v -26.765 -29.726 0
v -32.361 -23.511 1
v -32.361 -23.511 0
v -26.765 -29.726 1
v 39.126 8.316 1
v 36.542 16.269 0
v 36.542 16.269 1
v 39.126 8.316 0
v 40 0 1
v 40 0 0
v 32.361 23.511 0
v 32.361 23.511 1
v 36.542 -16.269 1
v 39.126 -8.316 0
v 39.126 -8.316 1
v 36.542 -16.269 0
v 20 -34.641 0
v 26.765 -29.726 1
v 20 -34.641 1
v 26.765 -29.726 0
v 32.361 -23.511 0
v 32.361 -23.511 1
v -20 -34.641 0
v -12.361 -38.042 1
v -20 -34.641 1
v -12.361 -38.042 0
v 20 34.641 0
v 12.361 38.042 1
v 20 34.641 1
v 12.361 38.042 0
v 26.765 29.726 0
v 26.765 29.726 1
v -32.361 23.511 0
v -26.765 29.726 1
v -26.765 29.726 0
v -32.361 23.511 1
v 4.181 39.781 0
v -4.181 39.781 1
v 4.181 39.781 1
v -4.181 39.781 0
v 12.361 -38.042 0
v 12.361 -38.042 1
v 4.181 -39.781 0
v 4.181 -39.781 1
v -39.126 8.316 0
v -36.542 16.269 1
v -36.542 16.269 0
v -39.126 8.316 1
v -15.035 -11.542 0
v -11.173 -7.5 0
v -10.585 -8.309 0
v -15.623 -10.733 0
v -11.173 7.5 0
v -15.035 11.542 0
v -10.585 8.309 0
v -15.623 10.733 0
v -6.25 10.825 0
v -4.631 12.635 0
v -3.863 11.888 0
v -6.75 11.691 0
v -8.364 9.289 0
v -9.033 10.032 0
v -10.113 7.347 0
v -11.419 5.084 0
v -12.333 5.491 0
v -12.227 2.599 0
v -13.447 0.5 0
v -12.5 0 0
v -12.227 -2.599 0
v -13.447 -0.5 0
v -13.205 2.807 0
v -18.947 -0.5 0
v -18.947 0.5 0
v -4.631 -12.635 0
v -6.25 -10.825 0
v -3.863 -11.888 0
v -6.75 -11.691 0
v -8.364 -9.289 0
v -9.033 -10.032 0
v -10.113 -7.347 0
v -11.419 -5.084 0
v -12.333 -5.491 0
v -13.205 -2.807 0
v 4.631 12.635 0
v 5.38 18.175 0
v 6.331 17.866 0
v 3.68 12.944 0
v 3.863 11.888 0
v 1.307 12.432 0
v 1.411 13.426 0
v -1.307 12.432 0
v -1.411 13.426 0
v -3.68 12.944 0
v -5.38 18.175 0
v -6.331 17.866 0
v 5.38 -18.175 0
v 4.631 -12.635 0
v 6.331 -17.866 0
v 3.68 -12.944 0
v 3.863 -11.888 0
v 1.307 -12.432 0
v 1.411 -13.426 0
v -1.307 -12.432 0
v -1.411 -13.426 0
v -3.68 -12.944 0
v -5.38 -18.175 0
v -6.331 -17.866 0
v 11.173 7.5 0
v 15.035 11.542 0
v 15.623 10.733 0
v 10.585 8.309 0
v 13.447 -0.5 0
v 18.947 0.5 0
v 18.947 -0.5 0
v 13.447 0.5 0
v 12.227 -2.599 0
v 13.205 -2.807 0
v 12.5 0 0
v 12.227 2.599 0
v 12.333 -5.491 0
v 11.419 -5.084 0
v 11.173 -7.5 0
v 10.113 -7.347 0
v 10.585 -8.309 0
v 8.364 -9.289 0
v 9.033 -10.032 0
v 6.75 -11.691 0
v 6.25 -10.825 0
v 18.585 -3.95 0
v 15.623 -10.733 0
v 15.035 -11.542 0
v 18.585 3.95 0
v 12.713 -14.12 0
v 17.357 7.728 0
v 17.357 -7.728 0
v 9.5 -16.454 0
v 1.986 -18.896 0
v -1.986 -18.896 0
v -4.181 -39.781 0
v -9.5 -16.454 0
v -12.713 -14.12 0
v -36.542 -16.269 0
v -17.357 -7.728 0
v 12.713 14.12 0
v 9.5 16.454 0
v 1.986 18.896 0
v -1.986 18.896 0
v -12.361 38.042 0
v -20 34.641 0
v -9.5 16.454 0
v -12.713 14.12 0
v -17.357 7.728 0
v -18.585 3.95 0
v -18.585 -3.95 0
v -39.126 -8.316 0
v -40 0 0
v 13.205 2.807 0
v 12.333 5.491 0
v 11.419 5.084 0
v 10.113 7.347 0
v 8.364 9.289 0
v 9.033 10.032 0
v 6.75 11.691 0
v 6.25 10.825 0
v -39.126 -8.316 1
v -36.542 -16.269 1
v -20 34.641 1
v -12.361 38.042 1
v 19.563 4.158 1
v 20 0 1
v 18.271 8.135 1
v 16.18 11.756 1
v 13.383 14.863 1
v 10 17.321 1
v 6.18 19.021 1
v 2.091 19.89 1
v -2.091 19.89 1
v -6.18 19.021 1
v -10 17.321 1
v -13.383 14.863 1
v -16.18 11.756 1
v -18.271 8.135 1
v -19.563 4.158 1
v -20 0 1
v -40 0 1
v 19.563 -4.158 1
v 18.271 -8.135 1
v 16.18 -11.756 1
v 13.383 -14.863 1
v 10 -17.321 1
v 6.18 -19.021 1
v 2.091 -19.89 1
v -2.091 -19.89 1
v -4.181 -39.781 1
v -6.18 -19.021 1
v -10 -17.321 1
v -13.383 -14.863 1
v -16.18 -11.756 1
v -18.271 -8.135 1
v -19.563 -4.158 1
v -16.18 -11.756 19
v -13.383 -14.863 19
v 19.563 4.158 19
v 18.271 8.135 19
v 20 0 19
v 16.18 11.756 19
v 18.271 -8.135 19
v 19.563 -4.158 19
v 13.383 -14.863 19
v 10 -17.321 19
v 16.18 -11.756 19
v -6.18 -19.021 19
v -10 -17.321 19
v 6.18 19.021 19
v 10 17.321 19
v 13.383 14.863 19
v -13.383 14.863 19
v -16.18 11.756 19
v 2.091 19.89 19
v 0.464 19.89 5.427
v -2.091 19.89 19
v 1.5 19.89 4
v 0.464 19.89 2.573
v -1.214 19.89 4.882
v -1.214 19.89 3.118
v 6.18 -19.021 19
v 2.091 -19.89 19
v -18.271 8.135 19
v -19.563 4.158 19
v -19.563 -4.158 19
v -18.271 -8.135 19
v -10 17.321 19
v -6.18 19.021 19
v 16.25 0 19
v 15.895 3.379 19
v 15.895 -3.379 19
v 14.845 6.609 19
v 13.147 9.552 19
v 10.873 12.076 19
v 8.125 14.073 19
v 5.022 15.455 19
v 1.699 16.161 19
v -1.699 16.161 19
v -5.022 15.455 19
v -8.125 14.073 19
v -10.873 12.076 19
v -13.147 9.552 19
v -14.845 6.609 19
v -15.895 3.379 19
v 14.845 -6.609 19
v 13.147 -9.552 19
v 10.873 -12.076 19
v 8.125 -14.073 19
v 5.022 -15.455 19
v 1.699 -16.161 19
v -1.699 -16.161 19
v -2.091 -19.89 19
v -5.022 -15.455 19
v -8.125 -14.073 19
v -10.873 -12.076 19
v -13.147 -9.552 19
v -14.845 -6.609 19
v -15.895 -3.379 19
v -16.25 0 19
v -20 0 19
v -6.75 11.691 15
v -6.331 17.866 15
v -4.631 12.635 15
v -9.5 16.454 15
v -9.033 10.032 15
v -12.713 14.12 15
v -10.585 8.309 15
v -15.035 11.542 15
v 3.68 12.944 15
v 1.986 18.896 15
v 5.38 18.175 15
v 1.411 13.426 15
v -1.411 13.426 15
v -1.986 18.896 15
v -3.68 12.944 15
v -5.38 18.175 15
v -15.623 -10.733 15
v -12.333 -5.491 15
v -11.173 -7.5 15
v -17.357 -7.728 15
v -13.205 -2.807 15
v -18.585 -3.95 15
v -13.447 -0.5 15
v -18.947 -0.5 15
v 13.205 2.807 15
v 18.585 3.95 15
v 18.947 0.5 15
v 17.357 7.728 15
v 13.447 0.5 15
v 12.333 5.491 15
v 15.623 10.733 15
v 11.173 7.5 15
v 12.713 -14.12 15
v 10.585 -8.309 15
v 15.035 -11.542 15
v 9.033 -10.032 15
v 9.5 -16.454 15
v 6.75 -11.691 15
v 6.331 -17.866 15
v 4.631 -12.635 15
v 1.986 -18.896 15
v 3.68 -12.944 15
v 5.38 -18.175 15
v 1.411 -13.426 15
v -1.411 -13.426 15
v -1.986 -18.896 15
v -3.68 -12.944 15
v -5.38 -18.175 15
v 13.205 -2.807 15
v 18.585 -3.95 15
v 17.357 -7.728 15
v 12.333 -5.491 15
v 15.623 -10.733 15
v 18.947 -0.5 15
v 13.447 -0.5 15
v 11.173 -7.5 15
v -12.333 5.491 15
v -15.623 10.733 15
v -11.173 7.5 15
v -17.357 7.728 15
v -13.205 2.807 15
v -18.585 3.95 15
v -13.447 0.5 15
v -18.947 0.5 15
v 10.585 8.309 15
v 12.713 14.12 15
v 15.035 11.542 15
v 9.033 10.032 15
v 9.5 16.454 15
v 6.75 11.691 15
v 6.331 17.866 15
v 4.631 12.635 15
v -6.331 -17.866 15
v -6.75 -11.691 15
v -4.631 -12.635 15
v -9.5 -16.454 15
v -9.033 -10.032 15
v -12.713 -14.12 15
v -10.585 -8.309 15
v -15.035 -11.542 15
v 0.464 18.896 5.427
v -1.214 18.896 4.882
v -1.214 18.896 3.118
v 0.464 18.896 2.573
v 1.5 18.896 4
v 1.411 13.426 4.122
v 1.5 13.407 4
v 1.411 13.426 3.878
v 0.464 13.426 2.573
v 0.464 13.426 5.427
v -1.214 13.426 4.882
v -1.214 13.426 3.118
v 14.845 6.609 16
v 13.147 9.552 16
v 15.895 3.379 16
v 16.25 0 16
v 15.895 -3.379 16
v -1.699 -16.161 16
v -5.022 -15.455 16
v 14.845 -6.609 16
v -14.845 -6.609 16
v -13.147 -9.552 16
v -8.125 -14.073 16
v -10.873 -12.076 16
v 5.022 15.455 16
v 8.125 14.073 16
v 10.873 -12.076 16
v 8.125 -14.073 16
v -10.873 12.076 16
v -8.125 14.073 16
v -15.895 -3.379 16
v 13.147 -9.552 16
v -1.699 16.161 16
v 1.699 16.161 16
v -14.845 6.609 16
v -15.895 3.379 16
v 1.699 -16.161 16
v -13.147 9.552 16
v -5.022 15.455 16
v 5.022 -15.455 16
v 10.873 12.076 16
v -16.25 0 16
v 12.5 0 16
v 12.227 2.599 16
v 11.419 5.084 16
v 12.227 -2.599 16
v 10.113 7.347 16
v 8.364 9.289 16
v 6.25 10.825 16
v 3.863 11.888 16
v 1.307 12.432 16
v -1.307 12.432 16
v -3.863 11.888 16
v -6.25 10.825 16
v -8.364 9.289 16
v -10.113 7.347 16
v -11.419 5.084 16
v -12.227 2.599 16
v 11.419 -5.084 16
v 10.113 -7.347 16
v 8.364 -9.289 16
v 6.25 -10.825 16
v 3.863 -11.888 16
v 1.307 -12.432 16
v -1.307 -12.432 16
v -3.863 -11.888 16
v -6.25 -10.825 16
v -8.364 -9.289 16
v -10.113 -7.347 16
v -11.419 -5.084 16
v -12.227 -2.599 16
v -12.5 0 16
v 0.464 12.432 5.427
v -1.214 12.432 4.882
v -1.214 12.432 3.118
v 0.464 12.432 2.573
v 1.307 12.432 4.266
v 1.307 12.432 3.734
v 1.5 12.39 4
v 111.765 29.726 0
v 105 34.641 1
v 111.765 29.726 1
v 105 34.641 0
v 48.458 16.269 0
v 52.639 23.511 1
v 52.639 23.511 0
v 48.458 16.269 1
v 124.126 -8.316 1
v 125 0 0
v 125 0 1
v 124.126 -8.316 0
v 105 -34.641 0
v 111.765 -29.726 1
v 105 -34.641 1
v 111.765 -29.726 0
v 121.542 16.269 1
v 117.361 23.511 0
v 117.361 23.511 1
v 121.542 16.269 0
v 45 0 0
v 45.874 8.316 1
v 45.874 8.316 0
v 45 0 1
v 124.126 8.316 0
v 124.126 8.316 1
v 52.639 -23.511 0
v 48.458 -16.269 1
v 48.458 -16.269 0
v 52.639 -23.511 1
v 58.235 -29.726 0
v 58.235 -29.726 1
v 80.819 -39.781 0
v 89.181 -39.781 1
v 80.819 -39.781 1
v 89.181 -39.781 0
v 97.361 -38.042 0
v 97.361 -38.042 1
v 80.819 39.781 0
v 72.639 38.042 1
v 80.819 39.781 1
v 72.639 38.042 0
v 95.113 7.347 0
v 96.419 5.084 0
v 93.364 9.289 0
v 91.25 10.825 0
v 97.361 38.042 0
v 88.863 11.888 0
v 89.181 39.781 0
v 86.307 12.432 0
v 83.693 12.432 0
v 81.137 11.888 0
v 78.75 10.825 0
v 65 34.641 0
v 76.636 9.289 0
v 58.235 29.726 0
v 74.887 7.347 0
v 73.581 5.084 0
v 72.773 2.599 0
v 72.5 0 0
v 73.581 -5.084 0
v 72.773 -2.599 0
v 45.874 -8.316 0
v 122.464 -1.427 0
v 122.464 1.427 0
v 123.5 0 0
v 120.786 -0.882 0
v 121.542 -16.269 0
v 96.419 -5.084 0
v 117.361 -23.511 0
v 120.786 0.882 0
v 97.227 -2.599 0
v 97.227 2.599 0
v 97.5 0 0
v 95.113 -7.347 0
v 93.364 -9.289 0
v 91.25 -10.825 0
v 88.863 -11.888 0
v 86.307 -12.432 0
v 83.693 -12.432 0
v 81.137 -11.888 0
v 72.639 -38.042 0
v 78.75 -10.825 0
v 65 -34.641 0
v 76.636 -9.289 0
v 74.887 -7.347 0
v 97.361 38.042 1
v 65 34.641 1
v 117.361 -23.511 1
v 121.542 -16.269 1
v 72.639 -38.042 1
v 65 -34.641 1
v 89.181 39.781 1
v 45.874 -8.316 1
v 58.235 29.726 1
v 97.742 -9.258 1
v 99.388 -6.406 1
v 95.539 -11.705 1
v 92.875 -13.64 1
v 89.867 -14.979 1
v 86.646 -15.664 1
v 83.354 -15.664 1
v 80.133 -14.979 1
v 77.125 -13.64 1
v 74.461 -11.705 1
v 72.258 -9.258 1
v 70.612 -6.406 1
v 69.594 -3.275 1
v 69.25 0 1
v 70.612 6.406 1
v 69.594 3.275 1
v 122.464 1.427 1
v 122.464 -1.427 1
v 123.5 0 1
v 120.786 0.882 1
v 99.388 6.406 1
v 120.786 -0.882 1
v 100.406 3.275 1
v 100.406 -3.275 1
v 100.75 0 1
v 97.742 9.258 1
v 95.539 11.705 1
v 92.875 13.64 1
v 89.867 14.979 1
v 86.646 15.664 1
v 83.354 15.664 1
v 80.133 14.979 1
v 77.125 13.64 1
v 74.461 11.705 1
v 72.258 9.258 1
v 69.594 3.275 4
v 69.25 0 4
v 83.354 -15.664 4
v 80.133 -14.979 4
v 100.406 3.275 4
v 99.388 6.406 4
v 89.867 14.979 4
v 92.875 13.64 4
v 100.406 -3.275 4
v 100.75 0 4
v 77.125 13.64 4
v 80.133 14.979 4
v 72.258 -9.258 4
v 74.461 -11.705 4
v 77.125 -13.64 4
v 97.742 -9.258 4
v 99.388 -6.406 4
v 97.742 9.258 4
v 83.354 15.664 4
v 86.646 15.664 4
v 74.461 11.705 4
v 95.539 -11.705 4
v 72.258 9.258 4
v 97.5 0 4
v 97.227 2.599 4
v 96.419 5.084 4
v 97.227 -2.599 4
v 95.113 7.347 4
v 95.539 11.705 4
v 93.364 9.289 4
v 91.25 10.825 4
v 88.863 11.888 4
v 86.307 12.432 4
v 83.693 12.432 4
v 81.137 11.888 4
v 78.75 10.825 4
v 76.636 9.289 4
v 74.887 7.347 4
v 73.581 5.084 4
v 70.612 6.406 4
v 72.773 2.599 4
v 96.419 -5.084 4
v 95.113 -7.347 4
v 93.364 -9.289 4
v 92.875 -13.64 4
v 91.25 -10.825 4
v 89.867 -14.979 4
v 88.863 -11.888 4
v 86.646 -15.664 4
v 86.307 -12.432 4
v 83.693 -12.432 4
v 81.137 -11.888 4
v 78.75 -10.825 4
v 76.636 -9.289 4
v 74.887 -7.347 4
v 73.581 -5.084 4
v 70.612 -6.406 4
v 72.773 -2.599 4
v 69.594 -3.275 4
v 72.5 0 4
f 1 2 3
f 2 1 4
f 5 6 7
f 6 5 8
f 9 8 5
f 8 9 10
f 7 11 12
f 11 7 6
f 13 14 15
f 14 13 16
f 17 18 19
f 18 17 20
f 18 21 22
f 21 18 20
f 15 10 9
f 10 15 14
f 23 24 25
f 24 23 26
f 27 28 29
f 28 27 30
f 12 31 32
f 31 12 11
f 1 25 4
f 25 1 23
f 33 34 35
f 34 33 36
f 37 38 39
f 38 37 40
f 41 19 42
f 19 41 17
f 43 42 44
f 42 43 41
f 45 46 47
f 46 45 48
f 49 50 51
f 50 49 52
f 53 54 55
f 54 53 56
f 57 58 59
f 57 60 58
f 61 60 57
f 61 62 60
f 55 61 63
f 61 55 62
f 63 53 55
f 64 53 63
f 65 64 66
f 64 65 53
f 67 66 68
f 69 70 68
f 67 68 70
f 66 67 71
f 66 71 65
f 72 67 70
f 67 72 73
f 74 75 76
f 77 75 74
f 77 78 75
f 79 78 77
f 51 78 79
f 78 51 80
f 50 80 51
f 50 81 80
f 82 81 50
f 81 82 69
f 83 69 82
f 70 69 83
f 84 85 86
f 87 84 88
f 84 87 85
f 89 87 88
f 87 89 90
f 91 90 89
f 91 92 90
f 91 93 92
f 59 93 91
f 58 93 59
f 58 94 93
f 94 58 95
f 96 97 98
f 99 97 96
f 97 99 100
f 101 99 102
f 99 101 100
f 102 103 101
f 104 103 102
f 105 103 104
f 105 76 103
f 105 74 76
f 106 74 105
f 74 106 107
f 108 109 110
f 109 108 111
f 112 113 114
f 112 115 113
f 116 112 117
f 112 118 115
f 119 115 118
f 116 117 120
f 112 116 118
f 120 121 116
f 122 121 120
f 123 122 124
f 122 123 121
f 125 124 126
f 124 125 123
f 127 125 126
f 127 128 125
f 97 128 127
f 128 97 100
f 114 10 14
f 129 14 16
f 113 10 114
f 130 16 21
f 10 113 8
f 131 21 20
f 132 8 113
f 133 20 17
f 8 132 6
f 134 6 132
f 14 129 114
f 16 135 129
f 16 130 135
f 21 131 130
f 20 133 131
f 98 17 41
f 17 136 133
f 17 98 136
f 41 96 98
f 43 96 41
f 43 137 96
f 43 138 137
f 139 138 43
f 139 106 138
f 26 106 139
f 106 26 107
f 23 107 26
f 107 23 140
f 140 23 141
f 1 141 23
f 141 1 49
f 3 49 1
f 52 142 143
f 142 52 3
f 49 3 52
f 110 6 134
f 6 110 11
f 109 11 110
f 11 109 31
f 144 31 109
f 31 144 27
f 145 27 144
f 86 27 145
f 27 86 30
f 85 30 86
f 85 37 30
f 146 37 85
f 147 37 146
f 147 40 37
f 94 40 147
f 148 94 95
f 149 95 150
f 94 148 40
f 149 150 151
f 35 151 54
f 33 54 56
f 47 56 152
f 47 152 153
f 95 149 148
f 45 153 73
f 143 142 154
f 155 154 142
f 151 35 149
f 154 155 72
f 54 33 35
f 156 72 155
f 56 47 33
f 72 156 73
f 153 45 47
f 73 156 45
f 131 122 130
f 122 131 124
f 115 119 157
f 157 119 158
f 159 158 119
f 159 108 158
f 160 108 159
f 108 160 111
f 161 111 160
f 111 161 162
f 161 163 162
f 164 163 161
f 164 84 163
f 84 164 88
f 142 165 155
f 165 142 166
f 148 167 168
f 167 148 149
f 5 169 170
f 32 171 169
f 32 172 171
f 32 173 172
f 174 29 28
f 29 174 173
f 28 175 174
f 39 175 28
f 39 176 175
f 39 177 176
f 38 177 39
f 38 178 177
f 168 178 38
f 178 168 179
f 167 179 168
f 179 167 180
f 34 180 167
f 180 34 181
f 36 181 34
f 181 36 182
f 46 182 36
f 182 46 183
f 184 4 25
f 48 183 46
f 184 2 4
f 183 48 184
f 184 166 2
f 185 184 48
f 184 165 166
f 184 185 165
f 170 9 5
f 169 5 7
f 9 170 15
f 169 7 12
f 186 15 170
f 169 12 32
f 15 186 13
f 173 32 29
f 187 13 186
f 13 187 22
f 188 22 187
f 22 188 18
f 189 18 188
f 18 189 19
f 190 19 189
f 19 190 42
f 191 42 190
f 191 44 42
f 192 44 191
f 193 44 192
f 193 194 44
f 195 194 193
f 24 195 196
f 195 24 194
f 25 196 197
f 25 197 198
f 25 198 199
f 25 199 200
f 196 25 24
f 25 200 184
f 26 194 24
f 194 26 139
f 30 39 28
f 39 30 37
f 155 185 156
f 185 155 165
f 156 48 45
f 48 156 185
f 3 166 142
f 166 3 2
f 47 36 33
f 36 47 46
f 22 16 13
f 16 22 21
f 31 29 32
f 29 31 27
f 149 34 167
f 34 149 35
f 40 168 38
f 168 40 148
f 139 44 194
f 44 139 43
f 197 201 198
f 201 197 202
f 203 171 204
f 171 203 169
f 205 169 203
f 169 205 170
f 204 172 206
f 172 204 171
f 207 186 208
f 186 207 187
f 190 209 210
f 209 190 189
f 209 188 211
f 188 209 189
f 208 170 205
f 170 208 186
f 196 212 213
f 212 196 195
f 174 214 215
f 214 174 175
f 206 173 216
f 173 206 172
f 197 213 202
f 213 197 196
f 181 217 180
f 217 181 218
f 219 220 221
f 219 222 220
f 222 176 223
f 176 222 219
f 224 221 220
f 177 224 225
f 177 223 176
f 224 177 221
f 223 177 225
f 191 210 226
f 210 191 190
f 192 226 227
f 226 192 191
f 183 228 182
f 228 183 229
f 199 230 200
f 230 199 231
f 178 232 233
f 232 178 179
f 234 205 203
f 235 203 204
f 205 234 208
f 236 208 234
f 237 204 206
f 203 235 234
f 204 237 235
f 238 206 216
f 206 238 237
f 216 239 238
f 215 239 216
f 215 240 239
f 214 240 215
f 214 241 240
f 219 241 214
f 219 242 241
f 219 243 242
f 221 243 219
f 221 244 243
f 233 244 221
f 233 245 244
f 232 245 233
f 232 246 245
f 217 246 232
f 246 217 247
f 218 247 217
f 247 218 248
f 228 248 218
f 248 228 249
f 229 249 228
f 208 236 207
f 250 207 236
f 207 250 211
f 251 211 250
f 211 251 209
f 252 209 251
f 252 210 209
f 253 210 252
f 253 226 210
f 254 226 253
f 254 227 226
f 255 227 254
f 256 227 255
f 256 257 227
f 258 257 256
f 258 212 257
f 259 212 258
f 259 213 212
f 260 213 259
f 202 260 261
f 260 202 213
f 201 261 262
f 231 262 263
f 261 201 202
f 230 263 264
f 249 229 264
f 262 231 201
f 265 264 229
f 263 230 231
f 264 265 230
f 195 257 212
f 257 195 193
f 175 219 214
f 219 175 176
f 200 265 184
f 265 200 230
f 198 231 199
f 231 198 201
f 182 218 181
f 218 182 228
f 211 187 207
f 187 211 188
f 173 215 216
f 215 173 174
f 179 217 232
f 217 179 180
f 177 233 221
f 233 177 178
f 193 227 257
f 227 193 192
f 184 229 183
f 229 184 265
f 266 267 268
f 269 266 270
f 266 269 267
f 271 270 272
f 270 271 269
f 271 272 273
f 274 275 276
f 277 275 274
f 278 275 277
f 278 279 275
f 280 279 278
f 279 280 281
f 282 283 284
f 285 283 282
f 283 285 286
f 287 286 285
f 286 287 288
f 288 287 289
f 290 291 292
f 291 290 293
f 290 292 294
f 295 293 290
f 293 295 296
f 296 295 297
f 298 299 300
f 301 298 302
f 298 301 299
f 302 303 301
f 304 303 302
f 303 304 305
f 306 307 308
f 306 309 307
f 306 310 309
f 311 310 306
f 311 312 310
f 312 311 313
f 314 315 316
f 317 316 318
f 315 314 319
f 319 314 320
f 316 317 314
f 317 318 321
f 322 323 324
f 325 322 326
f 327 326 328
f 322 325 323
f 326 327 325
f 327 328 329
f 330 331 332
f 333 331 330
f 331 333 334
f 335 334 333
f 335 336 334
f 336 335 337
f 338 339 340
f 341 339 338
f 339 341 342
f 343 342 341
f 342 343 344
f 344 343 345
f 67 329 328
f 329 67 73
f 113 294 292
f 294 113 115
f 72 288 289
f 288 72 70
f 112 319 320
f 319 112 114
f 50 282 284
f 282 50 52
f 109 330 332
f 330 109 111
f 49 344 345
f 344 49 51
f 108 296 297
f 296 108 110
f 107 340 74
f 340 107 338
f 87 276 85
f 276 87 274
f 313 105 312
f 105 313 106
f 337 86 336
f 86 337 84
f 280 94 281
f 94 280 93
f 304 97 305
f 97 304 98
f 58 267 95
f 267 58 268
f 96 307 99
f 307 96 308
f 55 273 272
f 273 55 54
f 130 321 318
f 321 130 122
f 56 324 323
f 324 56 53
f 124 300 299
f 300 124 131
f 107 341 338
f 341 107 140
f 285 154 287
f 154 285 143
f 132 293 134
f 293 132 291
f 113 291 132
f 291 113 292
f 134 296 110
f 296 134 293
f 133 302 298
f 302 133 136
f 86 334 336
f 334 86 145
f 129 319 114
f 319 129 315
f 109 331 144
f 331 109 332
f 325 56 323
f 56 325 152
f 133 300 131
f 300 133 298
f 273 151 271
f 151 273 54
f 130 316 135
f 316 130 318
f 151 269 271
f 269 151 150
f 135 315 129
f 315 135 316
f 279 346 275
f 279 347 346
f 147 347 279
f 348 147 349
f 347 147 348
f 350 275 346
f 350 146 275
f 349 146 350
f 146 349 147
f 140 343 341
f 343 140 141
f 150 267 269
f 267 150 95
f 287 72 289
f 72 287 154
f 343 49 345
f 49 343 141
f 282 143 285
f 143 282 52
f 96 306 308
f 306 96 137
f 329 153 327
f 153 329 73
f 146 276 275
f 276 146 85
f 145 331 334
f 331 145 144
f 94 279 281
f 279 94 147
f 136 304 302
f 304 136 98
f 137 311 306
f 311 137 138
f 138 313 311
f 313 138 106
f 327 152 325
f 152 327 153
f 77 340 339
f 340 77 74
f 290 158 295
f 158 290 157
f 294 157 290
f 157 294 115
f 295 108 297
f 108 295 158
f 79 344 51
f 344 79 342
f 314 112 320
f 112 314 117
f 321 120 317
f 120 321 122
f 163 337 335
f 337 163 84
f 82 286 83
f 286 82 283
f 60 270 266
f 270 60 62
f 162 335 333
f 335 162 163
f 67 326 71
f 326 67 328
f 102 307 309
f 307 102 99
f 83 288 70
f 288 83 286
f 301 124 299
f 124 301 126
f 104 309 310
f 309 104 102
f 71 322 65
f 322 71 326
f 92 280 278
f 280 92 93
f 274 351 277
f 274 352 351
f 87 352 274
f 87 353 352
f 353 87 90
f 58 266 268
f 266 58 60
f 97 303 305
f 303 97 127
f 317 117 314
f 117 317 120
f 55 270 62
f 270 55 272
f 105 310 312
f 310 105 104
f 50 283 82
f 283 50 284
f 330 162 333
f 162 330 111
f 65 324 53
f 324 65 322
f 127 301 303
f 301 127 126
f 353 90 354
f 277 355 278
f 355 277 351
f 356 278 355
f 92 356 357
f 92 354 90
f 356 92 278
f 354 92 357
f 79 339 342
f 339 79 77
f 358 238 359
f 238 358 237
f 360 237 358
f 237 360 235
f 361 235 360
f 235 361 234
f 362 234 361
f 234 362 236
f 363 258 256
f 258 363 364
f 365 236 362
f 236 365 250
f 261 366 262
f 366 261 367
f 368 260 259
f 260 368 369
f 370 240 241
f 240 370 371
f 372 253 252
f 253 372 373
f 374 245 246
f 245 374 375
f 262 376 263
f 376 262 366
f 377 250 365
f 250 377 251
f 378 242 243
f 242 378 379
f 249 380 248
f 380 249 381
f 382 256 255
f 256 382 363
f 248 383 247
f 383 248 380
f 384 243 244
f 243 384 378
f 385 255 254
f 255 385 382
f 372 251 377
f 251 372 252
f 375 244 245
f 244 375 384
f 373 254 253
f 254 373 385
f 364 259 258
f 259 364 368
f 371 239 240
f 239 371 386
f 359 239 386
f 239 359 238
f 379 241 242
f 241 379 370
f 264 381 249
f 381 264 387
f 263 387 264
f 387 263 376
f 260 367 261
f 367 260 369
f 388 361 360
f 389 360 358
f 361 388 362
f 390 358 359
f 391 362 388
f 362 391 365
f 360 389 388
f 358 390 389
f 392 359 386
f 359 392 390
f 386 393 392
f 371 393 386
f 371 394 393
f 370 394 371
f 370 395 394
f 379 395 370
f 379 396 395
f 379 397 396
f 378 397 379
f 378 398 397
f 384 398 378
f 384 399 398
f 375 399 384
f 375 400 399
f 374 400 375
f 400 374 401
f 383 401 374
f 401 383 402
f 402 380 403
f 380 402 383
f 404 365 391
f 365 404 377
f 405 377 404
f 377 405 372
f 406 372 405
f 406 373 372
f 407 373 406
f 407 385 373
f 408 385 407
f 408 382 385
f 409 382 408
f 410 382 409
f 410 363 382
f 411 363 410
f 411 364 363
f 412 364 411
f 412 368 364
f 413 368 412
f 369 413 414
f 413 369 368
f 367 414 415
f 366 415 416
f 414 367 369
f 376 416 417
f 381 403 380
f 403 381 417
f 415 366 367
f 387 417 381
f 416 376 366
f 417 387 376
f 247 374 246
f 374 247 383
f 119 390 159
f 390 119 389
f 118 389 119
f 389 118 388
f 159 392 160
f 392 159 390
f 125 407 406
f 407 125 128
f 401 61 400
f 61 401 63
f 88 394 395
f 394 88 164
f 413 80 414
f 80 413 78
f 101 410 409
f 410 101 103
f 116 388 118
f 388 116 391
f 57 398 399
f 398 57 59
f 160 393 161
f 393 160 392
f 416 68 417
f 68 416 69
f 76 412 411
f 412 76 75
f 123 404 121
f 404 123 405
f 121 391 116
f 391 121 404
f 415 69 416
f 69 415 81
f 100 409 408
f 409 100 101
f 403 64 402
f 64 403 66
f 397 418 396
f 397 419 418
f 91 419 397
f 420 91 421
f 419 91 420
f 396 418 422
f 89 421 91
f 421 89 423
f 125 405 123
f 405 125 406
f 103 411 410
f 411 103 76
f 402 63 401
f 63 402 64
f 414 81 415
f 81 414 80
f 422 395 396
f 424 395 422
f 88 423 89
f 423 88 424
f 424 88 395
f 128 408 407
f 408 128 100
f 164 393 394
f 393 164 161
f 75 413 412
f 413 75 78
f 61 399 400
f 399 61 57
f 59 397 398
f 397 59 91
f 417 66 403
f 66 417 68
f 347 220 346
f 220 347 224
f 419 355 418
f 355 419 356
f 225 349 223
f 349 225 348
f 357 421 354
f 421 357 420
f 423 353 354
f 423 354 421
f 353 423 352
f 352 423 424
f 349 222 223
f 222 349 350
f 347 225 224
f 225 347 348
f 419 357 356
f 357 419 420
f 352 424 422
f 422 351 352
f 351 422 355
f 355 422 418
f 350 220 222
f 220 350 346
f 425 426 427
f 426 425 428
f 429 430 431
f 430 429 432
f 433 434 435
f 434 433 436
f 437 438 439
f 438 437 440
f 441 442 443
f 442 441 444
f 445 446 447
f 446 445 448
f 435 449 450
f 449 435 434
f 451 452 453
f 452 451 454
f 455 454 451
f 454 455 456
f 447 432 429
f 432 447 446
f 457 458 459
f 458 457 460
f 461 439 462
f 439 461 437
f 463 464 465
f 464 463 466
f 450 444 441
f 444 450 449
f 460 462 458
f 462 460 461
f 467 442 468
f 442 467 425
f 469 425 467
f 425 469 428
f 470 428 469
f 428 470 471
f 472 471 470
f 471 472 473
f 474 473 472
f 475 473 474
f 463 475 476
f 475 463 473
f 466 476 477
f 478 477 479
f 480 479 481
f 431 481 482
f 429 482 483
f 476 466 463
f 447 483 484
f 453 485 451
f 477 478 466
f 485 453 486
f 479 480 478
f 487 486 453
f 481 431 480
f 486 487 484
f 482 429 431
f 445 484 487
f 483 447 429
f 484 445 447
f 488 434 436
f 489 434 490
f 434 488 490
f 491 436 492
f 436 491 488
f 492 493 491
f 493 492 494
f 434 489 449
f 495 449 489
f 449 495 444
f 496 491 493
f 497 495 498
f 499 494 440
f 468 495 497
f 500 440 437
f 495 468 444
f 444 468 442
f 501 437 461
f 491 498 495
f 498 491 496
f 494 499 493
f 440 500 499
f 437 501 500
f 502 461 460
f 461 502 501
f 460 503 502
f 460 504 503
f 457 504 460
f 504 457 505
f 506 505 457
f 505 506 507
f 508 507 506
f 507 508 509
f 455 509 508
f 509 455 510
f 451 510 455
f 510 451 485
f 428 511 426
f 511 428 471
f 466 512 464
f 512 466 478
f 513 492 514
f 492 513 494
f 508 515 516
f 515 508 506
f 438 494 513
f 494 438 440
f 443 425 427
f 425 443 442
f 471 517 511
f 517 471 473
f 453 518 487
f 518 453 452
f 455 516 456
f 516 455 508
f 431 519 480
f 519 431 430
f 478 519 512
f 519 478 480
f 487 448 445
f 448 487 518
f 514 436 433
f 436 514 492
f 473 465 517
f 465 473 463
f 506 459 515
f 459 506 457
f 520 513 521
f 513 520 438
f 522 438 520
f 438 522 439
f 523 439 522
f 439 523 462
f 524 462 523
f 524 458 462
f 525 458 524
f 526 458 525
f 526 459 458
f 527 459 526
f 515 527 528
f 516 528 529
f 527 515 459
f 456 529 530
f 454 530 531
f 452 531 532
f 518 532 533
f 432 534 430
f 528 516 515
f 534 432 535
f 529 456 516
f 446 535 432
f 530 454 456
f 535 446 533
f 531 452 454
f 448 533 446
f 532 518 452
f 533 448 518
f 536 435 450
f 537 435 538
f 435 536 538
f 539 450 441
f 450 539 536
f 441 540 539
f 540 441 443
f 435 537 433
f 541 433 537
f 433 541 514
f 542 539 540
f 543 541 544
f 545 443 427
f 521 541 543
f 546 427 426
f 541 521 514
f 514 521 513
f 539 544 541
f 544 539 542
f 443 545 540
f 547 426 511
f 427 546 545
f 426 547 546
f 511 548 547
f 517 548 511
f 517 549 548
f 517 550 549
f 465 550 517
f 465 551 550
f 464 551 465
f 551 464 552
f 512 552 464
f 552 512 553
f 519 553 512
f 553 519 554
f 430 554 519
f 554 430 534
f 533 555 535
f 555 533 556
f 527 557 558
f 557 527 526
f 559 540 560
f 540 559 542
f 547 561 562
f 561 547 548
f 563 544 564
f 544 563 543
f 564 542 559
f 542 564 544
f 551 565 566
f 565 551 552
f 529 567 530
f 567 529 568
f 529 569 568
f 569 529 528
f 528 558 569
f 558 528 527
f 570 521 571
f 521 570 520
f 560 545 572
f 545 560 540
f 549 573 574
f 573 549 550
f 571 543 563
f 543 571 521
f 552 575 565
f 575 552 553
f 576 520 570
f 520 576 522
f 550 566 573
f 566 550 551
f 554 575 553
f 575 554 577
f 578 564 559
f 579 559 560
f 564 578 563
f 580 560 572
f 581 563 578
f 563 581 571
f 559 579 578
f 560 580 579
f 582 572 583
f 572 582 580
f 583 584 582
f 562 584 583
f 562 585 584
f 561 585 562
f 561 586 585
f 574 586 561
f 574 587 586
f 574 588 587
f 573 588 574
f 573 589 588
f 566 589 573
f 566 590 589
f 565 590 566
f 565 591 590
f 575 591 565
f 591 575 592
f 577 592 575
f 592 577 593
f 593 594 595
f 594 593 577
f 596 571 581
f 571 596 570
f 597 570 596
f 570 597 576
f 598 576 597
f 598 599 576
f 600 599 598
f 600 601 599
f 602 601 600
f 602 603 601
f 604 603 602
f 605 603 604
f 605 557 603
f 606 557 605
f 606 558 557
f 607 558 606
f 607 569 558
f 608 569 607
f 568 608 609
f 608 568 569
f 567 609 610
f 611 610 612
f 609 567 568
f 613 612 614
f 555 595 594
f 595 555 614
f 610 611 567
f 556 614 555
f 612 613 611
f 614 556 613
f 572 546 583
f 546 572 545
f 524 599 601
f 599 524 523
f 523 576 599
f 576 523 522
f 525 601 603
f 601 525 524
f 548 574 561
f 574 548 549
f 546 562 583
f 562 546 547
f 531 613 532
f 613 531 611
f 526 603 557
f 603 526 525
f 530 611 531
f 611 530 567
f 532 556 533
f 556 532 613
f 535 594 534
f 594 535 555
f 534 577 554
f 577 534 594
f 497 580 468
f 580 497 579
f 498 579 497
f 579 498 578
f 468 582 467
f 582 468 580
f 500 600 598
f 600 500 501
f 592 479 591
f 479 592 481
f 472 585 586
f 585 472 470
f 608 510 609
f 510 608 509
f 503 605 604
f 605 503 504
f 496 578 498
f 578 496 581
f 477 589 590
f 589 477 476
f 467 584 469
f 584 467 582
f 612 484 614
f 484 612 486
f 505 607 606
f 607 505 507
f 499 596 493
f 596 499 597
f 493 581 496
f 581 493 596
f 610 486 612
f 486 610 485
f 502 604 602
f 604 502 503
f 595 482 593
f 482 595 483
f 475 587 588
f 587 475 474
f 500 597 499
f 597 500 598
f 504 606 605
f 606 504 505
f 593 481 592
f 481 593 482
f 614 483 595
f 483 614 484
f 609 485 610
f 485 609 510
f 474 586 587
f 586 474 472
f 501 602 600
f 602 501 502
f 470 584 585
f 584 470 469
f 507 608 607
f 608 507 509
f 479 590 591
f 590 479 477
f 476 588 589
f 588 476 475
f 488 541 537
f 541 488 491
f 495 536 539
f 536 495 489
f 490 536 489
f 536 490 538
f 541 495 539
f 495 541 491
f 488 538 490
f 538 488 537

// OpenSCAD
// Created by G. Robinson 21/09/2016
// Licence: creative commons - attribution

/* [Part Selection] */

// Select the part to generate
part = "all"; // [A:Part A,B:Part B,all:All]

/* [Spool Dimensions] */

// Diameter of the spool flanges, mm
flange_outer_diameter = 80; //mm
// Diameter of the core around which the cable is wrapped, mm
hub_outer_diameter = 40; //mm
// Diameter of the hole through the center of the spool hub, mm
hub_inner_diameter = 25; //mm
// Overall width of the spool (outside), mm
spool_width = 20; //mm
// Flange cutouts save material, maybe not time!
use_flange_cutouts = 0; //[0:No,1:Yes]

/* [Advanced Parameters] */

// Diameter of the cable hole in both flange and hub, mm
cable_hole_diameter = 3;
// Thickness of the flanges, mm
flange_thickness = 1;
// Thickness of the hub and web structures, mm
structure_thickness = 1;
// Depth of the locating socket in the B part, mm
socket_depth = 3;
// Radial clearance allowed between the locating boss and socket, mm
socket_clearance = 0.5; //mm on radius
// Number of webs to use in hub and flange
web_count = 5; //[3:2:15]
// Web thickness for flange, mm
flange_web_thickness = 5;

/* [Hidden] */

socketod = (hub_inner_diameter + hub_outer_diameter)/2*1;
recessdepth = spool_width-flange_thickness-socket_depth-structure_thickness;

if (part == "A")
{
    partA();
}
else if (part == "B")
{
    partB();
}
else if (part == "all")
{
    partA();
    translate([flange_outer_diameter+5,0,0]) { 
        partB(); 
    }
}

// geometry - hub half
module partA() {
difference() {
    union() {
        cylinder(flange_thickness, flange_outer_diameter/2, flange_outer_diameter/2, false);
        cylinder(spool_width - flange_thickness, hub_outer_diameter/2, hub_outer_diameter/2, false);
    }
    translate([0,0,spool_width-flange_thickness-socket_depth]) {
        cylinder(socket_depth, socketod/2, socketod/2, false);
    }
    cylinder(spool_width, hub_inner_diameter/2, hub_inner_diameter/2, false);
    translate([0,0,flange_thickness+(cable_hole_diameter*1)]) {
        rotate([-90,0,0]) { 
            cylinder(flange_outer_diameter,cable_hole_diameter/2,cable_hole_diameter/2,false);
        }
    }
    if ((hub_outer_diameter-hub_inner_diameter)/2-structure_thickness*2>=max(cable_hole_diameter,3))
    {
        difference() {
            cylinder(recessdepth,hub_outer_diameter/2-structure_thickness, hub_outer_diameter/2-structure_thickness,false);
            cylinder(recessdepth,hub_inner_diameter/2+structure_thickness, hub_inner_diameter/2+structure_thickness,false);
            for (i=[0:web_count-1]) {
                rotate([0,0,180/web_count*i]) {
                    cube([flange_outer_diameter,structure_thickness,recessdepth*2],true);
                }
            }
        }
    }
    if (use_flange_cutouts == 1)
    {
        flangeCutoutSolid();  
    }
}
}

// geometry - face half
module partB() {
    difference() {
        union() {
            cylinder(flange_thickness, flange_outer_diameter/2, flange_outer_diameter/2, false);
            cylinder(socket_depth+flange_thickness, socketod/2-socket_clearance, socketod/2-socket_clearance, false);
        }
        cylinder(spool_width, hub_inner_diameter/2, hub_inner_diameter/2, false);
        translate([flange_outer_diameter/2-(cable_hole_diameter*1),0,0]) {
            cylinder(flange_thickness,cable_hole_diameter/2,cable_hole_diameter/2,false);
        }
        if (use_flange_cutouts == 1)
        {
            flangeCutoutSolid();   
        }
    }
}

module flangeCutoutSolid() {
    difference() {
        cylinder(flange_thickness,flange_outer_diameter/2-flange_web_thickness, flange_outer_diameter/2-flange_web_thickness,false);
        cylinder(flange_thickness,hub_outer_diameter/2+flange_web_thickness, hub_outer_diameter/2+flange_web_thickness,false);
        for (i=[0:web_count-1]) {
            rotate([0,0,180/web_count*i]) {
                cube([flange_outer_diameter,flange_web_thickness,flange_thickness*2],true);
            }
        }    
    }
}
